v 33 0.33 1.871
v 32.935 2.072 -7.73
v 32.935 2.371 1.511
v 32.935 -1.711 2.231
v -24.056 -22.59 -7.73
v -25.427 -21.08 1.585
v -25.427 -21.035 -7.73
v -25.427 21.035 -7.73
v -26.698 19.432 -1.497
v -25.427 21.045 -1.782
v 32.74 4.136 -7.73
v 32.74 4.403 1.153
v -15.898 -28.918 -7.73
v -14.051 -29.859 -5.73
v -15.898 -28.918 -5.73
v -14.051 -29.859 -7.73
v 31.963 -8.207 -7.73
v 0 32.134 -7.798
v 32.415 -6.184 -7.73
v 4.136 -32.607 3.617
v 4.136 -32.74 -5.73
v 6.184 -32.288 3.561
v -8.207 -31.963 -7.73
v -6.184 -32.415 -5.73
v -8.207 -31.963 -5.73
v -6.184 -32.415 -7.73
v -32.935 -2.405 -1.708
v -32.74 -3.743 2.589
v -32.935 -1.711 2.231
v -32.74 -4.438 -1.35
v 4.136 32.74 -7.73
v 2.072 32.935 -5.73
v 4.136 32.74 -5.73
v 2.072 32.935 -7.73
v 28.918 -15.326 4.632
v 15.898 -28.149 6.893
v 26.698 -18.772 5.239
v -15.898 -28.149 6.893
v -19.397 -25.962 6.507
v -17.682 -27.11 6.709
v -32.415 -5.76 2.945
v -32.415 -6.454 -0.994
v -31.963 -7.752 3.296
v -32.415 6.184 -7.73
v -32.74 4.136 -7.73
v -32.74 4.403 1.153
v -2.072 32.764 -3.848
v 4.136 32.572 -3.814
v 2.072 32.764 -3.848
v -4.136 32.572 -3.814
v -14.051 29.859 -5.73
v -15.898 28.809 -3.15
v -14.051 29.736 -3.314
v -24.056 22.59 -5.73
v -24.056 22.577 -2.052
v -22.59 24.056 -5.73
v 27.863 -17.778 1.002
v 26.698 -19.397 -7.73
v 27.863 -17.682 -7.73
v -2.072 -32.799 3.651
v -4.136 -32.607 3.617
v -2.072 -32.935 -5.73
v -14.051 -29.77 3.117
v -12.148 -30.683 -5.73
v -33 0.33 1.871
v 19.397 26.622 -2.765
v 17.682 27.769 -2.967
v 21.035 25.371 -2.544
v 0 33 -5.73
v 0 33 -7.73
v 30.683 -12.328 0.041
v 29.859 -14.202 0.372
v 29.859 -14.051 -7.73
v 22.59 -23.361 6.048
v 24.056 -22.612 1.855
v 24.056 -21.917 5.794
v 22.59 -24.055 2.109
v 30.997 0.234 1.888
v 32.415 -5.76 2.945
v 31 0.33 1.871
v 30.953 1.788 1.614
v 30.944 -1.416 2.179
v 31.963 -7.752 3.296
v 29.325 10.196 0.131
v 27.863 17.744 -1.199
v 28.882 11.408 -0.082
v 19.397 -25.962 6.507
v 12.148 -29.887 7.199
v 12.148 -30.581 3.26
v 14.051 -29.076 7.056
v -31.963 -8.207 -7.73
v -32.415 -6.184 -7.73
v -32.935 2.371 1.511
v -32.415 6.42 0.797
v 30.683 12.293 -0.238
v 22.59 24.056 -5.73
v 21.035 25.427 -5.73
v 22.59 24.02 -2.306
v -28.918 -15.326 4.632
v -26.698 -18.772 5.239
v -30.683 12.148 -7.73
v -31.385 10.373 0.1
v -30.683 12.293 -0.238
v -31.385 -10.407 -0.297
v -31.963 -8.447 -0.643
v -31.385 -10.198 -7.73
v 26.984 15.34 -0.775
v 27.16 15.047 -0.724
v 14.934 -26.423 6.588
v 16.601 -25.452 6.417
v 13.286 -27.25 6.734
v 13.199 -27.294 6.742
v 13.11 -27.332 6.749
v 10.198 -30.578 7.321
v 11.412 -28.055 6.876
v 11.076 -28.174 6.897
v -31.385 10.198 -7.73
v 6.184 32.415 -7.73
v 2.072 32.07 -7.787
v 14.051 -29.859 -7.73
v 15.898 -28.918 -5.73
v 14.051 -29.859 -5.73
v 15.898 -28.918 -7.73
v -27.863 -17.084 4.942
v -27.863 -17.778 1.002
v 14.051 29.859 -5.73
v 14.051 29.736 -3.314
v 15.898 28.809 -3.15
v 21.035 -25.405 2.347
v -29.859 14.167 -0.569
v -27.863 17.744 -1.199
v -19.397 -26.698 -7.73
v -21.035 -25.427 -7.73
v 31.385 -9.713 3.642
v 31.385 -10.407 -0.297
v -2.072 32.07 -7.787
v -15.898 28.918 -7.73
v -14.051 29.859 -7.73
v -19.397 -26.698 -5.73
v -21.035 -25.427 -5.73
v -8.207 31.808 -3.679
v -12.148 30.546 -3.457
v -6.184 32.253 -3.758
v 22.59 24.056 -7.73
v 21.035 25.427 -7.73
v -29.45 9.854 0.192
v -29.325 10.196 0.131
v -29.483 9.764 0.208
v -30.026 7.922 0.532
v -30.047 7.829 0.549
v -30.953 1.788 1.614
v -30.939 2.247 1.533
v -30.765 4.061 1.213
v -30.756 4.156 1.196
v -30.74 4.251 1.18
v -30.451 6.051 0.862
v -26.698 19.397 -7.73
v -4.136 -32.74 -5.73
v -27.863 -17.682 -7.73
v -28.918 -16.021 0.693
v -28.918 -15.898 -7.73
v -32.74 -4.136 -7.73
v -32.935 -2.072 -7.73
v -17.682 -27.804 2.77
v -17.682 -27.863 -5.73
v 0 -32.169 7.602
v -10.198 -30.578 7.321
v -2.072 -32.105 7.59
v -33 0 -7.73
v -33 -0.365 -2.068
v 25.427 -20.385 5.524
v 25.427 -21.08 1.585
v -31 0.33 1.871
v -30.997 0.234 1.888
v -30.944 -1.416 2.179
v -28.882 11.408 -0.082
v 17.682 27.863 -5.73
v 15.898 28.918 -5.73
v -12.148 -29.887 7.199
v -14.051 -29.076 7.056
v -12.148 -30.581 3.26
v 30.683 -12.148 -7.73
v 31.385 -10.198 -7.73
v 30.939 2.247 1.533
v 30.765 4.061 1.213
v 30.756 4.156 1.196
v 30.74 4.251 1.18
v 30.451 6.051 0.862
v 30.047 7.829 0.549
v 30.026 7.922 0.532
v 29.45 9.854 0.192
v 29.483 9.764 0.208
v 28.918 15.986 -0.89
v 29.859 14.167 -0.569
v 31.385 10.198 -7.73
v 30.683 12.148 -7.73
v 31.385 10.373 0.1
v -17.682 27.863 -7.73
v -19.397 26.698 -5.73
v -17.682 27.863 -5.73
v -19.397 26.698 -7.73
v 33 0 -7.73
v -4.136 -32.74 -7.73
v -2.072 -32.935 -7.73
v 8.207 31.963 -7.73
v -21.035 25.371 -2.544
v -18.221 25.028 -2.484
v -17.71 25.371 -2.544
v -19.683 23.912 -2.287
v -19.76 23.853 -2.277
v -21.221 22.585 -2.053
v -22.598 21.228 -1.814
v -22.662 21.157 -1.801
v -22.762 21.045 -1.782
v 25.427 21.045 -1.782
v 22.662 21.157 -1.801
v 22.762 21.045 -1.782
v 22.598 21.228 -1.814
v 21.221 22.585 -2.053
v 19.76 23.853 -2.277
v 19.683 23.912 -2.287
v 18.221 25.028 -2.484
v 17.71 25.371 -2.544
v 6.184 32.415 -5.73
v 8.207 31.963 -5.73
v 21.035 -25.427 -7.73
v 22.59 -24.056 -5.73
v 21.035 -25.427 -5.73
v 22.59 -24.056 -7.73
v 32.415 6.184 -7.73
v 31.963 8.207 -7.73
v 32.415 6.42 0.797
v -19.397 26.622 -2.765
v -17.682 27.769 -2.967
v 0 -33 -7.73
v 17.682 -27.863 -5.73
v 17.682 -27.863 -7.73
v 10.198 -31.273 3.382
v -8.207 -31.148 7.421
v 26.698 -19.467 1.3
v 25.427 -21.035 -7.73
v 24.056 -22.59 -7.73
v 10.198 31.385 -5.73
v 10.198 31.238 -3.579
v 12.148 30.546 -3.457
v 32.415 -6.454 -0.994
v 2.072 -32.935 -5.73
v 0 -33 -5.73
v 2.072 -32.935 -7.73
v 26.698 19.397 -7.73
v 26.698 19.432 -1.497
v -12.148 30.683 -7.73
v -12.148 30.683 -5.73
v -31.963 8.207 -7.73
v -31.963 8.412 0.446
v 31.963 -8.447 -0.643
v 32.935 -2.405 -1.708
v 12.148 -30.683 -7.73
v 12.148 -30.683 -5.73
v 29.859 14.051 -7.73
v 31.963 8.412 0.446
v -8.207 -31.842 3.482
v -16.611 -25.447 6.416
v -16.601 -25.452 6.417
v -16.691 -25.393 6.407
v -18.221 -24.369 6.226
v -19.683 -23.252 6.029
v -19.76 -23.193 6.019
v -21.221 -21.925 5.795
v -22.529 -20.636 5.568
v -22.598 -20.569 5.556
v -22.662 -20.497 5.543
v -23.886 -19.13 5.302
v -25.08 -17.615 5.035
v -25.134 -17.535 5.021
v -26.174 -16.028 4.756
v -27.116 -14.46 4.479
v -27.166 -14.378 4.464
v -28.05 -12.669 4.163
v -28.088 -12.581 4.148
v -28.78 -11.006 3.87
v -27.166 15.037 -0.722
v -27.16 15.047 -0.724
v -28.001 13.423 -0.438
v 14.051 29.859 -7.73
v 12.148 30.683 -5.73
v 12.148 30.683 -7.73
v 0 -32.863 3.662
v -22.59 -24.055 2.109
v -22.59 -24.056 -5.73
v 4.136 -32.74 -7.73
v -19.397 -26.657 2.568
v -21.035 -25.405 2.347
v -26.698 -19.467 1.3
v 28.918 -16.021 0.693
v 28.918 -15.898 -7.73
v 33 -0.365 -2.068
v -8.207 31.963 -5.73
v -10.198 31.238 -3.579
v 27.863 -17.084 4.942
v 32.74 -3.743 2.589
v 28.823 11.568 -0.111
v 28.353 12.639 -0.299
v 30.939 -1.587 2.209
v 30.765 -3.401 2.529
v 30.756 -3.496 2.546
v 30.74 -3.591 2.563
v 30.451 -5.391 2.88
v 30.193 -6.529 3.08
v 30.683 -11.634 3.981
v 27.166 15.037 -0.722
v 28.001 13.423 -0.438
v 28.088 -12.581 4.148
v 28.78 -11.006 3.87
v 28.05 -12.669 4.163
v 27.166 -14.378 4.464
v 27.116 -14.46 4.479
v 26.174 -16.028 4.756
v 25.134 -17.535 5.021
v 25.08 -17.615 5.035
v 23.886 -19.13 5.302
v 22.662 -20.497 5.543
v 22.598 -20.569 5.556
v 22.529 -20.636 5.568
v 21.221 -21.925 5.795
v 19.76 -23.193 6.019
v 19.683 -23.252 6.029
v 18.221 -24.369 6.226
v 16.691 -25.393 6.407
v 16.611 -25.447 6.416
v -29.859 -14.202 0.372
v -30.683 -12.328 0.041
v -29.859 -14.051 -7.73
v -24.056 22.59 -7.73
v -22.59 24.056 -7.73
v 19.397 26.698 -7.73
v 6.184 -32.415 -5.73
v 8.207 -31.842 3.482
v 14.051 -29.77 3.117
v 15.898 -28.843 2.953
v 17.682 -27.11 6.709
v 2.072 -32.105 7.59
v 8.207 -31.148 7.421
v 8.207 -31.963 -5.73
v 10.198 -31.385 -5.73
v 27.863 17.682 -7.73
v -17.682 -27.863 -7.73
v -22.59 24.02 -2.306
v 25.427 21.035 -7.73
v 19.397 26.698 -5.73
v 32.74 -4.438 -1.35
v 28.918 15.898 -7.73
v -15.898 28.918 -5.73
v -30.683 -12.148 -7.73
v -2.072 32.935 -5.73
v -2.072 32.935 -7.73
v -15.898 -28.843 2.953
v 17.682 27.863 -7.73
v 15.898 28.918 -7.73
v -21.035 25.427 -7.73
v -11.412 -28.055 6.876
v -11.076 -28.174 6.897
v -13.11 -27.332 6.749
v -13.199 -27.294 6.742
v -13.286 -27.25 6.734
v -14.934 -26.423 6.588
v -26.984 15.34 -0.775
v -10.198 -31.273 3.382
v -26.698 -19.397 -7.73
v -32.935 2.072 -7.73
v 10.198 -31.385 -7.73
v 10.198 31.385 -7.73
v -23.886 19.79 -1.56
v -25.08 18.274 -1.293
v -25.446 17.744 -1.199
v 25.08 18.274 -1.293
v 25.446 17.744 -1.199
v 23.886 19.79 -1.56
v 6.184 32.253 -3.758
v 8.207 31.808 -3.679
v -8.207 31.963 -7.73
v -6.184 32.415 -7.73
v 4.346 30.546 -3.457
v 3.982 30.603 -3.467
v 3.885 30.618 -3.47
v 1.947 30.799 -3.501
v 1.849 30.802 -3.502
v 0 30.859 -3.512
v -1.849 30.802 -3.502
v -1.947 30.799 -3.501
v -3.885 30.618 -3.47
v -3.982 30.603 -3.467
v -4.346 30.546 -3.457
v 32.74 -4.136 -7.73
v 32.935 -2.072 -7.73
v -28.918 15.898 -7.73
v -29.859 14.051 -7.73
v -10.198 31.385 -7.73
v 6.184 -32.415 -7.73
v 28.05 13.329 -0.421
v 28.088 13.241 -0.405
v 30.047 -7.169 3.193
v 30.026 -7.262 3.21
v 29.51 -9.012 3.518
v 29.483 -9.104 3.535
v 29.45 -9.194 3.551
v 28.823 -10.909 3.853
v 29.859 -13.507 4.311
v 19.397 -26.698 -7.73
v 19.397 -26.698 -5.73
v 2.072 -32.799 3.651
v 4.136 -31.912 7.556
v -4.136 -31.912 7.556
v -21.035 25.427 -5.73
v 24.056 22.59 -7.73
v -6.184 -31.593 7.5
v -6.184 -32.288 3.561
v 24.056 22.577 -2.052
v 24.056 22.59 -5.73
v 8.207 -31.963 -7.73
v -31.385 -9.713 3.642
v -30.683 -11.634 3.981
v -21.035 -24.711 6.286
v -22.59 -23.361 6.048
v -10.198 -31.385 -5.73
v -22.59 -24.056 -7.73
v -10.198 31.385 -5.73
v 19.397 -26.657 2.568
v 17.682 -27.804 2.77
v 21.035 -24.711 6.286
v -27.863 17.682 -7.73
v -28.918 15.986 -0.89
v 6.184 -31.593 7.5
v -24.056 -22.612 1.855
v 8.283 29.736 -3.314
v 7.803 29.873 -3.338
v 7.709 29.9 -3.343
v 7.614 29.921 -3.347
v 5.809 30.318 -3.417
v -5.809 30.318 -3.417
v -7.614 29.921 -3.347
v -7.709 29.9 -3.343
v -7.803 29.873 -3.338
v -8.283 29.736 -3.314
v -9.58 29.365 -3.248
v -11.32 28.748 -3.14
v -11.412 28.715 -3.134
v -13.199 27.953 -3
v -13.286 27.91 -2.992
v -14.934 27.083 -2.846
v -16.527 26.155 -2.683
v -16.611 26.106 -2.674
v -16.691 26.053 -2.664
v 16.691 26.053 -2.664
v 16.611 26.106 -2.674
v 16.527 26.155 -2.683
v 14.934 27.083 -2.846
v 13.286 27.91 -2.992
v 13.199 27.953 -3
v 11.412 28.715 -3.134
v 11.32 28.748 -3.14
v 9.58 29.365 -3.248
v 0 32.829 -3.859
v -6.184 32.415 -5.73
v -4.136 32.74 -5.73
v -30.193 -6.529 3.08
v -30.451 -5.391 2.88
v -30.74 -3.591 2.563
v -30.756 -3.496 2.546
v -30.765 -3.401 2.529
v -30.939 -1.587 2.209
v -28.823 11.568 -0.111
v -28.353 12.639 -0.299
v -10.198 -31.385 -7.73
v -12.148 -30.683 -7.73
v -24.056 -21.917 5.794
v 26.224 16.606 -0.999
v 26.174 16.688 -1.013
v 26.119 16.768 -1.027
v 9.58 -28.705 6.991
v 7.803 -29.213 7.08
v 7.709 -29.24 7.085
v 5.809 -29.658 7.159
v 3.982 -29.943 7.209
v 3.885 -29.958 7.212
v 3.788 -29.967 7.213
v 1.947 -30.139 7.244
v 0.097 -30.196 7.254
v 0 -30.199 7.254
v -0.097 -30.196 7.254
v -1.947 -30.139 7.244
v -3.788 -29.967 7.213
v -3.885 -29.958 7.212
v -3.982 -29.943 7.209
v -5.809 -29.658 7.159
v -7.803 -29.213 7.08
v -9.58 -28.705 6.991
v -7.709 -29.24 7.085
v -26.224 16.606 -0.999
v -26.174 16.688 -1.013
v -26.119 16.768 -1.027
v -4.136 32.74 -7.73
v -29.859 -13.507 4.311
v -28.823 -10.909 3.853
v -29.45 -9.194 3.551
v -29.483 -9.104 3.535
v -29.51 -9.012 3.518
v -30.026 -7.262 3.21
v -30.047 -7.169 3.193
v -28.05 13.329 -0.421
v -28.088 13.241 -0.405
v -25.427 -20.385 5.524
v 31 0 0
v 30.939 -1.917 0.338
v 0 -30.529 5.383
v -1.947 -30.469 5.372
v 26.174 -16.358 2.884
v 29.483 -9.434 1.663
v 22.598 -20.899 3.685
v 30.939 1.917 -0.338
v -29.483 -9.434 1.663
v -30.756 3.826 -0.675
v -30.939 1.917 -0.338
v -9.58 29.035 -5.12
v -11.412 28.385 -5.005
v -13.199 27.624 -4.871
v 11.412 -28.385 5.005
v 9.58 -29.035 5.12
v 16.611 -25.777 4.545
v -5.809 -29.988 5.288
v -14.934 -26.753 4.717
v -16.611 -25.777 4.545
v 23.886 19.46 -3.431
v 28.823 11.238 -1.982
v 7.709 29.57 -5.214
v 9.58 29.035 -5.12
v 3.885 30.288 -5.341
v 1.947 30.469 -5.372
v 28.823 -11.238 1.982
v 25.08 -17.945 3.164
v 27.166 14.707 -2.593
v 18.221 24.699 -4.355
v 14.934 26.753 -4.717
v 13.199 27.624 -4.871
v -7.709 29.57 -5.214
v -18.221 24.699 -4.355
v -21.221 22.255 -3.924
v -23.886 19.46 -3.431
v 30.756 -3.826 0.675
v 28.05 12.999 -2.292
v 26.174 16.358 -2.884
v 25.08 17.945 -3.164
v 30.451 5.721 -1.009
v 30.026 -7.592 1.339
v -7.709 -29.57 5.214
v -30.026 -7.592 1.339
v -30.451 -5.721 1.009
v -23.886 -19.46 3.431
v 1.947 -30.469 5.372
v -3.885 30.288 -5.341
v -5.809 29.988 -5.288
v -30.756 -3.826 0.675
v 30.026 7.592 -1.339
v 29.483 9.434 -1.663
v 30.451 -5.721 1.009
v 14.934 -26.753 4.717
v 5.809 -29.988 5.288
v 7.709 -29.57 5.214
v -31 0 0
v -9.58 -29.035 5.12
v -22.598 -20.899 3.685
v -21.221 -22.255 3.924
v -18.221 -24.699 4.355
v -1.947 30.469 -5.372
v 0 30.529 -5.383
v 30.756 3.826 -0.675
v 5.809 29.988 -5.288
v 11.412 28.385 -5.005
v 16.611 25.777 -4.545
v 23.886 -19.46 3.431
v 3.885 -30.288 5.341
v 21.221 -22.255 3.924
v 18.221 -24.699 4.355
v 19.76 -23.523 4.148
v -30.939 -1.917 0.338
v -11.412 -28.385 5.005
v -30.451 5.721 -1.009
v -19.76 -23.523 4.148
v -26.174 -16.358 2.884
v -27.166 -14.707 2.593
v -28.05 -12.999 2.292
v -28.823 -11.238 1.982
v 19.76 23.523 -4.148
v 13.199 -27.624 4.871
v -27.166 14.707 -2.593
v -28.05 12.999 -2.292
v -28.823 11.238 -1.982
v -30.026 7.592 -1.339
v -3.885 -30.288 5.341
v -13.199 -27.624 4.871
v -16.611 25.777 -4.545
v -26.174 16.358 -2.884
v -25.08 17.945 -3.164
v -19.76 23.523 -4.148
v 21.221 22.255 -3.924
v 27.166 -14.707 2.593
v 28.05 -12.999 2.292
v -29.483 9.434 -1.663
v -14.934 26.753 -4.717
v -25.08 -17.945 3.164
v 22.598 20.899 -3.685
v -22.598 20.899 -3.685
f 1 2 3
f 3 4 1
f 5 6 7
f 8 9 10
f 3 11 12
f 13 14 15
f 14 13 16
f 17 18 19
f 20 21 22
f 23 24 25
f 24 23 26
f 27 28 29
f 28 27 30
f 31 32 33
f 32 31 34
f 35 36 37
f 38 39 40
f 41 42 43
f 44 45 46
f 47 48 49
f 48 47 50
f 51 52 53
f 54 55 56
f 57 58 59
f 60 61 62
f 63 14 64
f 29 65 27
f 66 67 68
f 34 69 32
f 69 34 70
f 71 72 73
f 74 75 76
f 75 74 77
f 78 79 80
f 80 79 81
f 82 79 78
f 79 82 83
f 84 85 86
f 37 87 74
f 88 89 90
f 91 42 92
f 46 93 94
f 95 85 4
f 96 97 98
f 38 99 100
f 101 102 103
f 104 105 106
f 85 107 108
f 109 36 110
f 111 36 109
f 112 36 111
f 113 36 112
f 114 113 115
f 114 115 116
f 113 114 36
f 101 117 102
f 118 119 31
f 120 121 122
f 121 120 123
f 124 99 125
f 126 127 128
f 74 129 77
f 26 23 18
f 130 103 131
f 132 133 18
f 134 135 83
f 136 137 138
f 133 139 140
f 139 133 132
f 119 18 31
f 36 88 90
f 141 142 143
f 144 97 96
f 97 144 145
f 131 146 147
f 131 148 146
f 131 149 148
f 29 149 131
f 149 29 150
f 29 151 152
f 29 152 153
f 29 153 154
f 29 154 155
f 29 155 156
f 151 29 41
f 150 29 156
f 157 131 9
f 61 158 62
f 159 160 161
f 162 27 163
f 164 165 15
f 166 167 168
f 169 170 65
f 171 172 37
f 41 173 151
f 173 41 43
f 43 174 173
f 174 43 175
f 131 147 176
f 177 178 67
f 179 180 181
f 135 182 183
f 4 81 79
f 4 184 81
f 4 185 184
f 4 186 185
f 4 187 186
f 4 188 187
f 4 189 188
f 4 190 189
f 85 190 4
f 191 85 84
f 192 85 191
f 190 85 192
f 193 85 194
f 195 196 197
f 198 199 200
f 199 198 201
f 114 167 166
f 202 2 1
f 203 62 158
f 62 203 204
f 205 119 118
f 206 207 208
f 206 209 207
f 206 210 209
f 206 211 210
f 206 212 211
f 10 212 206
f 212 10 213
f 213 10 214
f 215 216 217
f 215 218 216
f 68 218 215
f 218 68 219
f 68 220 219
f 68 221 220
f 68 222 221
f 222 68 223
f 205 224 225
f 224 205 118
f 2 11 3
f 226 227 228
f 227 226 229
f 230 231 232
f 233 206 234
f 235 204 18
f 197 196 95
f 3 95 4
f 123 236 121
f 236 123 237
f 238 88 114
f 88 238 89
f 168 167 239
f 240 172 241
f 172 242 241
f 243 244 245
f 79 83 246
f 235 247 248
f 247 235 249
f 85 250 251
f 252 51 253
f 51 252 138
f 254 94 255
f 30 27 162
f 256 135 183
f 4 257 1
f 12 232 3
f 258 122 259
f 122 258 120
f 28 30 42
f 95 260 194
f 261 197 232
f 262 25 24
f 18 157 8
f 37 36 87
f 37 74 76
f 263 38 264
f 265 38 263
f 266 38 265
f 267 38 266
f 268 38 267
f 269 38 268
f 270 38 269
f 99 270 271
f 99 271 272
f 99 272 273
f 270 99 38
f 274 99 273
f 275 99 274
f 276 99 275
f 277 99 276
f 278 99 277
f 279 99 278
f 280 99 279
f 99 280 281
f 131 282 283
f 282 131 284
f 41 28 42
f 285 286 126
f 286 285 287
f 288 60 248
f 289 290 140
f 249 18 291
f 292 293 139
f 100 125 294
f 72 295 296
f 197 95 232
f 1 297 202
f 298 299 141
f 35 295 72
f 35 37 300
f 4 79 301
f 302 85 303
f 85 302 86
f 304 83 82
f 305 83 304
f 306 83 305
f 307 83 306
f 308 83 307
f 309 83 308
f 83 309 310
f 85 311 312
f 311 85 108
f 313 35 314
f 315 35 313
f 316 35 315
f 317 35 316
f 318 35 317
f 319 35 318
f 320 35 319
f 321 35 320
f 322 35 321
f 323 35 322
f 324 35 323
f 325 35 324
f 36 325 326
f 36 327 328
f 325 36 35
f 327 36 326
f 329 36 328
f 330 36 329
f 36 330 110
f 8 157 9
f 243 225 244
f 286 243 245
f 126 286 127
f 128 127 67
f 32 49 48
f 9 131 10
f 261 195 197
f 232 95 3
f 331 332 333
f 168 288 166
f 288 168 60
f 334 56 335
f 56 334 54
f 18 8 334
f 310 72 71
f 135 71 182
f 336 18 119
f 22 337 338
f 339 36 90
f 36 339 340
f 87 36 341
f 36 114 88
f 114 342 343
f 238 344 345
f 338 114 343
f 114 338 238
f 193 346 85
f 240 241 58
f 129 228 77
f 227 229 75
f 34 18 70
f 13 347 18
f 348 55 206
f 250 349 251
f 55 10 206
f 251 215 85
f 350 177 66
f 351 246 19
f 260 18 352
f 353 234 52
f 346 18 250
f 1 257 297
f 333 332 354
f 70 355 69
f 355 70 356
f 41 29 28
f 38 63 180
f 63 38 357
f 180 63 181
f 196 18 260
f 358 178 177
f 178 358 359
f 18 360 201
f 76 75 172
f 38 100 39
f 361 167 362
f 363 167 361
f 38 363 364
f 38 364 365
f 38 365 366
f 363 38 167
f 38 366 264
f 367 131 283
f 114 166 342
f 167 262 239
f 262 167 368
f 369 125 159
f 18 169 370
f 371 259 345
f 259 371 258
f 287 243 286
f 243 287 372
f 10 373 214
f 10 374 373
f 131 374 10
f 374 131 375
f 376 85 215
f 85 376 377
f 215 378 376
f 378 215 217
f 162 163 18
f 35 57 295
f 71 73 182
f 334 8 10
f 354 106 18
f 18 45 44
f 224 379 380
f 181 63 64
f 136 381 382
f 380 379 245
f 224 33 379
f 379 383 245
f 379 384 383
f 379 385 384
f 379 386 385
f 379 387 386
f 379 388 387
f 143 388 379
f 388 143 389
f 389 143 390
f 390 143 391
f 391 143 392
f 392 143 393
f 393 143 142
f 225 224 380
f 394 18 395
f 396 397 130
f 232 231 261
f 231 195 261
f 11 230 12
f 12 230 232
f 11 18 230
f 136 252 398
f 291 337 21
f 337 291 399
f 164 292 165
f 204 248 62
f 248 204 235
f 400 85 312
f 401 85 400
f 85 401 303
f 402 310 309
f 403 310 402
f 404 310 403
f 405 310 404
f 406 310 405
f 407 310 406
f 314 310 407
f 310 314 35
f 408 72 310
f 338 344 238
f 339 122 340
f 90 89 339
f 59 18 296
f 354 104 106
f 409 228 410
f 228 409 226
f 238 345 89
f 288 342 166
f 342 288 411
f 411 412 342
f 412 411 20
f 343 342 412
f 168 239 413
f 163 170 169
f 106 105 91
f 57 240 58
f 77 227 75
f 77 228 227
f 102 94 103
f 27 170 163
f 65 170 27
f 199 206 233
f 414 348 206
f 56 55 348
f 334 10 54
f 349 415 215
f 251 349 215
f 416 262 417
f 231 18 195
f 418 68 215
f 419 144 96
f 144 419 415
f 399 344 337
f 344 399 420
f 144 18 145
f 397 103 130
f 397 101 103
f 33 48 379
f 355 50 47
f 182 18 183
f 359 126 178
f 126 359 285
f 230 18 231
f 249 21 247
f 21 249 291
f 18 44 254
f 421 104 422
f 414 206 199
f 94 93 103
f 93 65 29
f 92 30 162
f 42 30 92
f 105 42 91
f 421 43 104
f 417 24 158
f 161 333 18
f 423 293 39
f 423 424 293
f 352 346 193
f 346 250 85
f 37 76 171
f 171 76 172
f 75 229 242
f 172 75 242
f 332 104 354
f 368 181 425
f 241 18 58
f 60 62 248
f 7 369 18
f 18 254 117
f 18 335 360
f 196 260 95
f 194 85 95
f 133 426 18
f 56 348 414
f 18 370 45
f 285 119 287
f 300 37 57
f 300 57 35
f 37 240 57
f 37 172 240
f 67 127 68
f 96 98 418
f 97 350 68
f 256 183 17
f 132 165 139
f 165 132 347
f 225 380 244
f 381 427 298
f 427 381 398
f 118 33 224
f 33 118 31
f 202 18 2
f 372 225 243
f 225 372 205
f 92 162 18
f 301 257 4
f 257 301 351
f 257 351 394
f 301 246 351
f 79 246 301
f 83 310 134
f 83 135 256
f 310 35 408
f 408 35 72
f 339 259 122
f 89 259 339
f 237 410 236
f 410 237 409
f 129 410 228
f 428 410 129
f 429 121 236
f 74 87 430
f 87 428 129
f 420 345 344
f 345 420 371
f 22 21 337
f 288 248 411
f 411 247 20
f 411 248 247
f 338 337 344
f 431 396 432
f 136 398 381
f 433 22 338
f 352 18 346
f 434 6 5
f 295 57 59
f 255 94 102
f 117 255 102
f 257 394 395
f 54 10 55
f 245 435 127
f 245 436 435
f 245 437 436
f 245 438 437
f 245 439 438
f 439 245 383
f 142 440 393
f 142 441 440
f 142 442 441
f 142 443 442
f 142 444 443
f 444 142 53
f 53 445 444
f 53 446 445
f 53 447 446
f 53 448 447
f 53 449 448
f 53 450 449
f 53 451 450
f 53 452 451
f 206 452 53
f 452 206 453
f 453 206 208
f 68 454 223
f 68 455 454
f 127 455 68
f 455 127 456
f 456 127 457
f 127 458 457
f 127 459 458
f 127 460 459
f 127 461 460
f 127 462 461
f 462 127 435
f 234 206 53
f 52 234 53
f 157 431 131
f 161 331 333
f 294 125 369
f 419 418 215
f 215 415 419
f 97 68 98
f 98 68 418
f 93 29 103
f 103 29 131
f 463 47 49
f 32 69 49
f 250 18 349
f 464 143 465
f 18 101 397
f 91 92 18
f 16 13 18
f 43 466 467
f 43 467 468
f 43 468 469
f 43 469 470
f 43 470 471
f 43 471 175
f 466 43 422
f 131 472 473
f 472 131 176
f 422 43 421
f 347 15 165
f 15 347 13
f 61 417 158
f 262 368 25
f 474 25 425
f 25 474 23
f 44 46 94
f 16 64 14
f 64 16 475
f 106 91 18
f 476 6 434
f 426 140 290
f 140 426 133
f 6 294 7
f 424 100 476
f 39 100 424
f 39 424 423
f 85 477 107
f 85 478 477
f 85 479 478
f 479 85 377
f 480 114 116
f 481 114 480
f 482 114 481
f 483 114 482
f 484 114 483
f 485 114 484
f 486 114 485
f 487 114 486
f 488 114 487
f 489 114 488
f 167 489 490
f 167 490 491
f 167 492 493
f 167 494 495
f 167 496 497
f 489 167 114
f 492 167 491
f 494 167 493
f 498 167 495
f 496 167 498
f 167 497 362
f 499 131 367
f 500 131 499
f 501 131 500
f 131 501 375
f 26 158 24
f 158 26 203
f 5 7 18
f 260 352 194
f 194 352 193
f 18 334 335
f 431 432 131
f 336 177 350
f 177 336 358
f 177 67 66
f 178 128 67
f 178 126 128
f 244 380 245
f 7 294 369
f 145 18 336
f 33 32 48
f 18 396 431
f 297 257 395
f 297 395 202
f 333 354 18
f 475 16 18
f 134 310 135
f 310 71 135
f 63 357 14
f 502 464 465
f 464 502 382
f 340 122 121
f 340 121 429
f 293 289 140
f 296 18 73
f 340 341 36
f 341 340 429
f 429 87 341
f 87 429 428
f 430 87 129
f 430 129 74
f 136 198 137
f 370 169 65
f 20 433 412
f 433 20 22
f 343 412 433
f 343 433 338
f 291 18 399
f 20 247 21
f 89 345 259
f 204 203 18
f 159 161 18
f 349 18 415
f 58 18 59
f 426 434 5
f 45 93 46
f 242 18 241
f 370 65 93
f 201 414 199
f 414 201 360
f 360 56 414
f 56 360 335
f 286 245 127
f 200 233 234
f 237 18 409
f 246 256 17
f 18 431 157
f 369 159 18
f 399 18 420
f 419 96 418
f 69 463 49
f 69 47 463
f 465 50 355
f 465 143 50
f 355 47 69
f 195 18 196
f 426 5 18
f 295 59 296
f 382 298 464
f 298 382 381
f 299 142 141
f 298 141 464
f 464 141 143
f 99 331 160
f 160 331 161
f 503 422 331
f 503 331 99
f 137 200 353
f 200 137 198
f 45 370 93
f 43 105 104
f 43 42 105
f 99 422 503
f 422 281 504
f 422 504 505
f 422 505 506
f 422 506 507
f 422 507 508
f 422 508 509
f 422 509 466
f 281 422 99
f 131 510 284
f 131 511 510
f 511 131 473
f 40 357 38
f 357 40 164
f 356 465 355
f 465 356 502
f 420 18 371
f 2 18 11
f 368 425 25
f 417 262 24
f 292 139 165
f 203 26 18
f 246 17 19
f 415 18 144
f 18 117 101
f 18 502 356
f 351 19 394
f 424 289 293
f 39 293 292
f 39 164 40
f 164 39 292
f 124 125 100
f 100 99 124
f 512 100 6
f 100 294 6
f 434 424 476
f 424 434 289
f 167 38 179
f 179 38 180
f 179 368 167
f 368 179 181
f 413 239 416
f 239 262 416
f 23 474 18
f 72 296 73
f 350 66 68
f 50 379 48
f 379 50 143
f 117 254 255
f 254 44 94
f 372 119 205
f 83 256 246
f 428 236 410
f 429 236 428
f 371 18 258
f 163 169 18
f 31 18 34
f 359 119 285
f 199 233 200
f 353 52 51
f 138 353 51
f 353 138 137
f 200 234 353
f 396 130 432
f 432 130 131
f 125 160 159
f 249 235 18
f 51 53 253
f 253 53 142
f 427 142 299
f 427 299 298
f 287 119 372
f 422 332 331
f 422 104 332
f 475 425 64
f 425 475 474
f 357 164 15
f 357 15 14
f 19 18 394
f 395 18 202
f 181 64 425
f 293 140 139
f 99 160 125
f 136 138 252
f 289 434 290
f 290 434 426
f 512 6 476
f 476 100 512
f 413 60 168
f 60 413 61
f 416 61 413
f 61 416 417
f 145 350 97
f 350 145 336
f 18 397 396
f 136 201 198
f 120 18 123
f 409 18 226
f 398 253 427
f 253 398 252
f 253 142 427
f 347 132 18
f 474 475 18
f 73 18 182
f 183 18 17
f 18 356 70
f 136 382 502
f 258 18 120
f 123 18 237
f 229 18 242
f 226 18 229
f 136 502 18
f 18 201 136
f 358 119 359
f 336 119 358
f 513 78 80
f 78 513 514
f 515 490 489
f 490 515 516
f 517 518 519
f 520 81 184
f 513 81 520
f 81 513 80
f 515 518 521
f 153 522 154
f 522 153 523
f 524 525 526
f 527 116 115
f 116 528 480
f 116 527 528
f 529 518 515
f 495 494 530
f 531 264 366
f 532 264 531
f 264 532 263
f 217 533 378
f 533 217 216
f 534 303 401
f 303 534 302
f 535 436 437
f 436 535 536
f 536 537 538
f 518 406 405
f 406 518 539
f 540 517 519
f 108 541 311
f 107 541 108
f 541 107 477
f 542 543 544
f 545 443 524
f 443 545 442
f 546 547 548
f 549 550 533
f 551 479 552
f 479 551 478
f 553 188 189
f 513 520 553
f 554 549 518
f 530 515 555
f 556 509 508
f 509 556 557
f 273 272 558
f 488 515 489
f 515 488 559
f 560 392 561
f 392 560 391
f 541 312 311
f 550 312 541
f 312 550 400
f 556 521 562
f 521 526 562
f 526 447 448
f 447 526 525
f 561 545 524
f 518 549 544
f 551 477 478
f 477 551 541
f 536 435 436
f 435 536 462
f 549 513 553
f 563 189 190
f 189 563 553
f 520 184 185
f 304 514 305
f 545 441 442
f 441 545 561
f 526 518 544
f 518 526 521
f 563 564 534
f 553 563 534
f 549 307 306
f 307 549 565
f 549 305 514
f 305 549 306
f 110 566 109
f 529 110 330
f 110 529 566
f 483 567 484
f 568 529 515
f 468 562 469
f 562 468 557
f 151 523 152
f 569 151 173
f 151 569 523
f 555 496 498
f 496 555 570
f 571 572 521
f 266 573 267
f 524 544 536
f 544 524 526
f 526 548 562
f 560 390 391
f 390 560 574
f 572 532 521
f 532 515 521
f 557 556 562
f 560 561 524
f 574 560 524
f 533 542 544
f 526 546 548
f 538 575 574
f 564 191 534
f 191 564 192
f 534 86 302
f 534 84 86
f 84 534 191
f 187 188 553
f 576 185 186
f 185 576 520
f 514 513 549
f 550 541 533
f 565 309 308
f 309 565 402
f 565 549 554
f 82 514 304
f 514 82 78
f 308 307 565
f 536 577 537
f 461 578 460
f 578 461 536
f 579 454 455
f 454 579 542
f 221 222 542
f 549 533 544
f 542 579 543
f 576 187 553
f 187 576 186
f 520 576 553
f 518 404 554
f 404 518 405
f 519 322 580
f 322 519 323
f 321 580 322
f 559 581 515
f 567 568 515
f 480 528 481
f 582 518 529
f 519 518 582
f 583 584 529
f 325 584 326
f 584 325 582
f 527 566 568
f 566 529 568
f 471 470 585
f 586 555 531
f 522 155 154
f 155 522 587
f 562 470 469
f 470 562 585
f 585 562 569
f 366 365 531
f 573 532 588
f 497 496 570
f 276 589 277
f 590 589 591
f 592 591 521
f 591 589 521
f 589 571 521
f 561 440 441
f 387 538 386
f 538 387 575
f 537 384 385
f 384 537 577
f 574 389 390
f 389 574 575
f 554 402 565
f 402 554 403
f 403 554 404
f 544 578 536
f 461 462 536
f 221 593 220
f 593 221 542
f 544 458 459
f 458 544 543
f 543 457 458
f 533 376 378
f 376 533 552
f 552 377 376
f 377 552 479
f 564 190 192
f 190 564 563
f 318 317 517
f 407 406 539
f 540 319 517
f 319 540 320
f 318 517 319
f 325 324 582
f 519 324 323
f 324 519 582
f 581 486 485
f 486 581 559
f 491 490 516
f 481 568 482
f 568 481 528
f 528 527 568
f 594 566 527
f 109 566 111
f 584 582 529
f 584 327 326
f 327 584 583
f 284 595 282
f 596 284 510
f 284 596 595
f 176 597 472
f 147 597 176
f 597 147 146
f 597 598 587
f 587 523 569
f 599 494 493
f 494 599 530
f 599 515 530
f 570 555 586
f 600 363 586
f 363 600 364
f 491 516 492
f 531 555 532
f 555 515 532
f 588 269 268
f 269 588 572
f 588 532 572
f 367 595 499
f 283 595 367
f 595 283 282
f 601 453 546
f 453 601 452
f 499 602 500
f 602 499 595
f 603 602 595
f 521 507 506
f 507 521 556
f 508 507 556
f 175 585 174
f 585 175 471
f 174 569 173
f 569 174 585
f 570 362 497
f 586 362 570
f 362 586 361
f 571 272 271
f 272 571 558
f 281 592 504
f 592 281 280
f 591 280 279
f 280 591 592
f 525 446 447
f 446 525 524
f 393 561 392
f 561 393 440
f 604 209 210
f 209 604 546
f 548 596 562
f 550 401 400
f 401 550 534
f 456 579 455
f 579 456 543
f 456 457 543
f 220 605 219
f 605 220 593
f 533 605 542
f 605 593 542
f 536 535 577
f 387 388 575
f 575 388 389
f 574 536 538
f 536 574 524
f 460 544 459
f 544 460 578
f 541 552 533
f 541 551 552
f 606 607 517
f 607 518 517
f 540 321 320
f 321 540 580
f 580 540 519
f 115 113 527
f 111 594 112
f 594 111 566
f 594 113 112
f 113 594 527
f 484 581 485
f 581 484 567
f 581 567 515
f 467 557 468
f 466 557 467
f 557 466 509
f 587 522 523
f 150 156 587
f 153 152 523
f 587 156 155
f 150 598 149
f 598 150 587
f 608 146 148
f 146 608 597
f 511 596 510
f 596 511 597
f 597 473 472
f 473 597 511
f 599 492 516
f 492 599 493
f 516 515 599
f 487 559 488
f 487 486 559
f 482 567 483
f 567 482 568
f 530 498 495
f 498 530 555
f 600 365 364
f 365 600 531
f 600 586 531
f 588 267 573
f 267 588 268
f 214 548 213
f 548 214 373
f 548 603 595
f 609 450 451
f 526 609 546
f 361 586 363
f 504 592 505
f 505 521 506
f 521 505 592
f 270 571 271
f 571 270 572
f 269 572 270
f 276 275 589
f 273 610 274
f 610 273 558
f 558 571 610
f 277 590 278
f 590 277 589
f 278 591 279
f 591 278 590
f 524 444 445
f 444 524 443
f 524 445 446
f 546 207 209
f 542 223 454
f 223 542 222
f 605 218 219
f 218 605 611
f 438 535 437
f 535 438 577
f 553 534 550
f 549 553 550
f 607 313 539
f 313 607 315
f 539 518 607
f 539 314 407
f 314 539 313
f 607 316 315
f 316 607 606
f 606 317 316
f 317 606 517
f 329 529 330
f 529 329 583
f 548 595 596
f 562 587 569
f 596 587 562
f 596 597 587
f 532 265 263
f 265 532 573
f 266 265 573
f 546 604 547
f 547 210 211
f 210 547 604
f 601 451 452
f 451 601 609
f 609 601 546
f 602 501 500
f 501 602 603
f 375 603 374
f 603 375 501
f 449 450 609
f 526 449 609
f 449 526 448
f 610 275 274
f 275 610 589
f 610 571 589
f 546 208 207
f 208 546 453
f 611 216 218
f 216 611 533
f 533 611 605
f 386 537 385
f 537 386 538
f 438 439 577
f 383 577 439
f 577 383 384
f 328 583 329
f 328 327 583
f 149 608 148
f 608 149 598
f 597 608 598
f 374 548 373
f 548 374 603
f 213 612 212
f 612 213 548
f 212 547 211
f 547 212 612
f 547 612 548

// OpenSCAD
$fn=100;
r_cap=62/2;
d=2;

difference() {
hull() {
rotate([-10,0,0]) {
    translate([0,0,-d-0.1])
cylinder(r=r_cap+d, h=d*2);
}
translate([0,0,-sin(10)*(r_cap+d)-d])
cylinder(r=r_cap+d, h=d);
}

rotate([-10,0,0]) {
    cylinder(r=r_cap, h=d);
}
}
